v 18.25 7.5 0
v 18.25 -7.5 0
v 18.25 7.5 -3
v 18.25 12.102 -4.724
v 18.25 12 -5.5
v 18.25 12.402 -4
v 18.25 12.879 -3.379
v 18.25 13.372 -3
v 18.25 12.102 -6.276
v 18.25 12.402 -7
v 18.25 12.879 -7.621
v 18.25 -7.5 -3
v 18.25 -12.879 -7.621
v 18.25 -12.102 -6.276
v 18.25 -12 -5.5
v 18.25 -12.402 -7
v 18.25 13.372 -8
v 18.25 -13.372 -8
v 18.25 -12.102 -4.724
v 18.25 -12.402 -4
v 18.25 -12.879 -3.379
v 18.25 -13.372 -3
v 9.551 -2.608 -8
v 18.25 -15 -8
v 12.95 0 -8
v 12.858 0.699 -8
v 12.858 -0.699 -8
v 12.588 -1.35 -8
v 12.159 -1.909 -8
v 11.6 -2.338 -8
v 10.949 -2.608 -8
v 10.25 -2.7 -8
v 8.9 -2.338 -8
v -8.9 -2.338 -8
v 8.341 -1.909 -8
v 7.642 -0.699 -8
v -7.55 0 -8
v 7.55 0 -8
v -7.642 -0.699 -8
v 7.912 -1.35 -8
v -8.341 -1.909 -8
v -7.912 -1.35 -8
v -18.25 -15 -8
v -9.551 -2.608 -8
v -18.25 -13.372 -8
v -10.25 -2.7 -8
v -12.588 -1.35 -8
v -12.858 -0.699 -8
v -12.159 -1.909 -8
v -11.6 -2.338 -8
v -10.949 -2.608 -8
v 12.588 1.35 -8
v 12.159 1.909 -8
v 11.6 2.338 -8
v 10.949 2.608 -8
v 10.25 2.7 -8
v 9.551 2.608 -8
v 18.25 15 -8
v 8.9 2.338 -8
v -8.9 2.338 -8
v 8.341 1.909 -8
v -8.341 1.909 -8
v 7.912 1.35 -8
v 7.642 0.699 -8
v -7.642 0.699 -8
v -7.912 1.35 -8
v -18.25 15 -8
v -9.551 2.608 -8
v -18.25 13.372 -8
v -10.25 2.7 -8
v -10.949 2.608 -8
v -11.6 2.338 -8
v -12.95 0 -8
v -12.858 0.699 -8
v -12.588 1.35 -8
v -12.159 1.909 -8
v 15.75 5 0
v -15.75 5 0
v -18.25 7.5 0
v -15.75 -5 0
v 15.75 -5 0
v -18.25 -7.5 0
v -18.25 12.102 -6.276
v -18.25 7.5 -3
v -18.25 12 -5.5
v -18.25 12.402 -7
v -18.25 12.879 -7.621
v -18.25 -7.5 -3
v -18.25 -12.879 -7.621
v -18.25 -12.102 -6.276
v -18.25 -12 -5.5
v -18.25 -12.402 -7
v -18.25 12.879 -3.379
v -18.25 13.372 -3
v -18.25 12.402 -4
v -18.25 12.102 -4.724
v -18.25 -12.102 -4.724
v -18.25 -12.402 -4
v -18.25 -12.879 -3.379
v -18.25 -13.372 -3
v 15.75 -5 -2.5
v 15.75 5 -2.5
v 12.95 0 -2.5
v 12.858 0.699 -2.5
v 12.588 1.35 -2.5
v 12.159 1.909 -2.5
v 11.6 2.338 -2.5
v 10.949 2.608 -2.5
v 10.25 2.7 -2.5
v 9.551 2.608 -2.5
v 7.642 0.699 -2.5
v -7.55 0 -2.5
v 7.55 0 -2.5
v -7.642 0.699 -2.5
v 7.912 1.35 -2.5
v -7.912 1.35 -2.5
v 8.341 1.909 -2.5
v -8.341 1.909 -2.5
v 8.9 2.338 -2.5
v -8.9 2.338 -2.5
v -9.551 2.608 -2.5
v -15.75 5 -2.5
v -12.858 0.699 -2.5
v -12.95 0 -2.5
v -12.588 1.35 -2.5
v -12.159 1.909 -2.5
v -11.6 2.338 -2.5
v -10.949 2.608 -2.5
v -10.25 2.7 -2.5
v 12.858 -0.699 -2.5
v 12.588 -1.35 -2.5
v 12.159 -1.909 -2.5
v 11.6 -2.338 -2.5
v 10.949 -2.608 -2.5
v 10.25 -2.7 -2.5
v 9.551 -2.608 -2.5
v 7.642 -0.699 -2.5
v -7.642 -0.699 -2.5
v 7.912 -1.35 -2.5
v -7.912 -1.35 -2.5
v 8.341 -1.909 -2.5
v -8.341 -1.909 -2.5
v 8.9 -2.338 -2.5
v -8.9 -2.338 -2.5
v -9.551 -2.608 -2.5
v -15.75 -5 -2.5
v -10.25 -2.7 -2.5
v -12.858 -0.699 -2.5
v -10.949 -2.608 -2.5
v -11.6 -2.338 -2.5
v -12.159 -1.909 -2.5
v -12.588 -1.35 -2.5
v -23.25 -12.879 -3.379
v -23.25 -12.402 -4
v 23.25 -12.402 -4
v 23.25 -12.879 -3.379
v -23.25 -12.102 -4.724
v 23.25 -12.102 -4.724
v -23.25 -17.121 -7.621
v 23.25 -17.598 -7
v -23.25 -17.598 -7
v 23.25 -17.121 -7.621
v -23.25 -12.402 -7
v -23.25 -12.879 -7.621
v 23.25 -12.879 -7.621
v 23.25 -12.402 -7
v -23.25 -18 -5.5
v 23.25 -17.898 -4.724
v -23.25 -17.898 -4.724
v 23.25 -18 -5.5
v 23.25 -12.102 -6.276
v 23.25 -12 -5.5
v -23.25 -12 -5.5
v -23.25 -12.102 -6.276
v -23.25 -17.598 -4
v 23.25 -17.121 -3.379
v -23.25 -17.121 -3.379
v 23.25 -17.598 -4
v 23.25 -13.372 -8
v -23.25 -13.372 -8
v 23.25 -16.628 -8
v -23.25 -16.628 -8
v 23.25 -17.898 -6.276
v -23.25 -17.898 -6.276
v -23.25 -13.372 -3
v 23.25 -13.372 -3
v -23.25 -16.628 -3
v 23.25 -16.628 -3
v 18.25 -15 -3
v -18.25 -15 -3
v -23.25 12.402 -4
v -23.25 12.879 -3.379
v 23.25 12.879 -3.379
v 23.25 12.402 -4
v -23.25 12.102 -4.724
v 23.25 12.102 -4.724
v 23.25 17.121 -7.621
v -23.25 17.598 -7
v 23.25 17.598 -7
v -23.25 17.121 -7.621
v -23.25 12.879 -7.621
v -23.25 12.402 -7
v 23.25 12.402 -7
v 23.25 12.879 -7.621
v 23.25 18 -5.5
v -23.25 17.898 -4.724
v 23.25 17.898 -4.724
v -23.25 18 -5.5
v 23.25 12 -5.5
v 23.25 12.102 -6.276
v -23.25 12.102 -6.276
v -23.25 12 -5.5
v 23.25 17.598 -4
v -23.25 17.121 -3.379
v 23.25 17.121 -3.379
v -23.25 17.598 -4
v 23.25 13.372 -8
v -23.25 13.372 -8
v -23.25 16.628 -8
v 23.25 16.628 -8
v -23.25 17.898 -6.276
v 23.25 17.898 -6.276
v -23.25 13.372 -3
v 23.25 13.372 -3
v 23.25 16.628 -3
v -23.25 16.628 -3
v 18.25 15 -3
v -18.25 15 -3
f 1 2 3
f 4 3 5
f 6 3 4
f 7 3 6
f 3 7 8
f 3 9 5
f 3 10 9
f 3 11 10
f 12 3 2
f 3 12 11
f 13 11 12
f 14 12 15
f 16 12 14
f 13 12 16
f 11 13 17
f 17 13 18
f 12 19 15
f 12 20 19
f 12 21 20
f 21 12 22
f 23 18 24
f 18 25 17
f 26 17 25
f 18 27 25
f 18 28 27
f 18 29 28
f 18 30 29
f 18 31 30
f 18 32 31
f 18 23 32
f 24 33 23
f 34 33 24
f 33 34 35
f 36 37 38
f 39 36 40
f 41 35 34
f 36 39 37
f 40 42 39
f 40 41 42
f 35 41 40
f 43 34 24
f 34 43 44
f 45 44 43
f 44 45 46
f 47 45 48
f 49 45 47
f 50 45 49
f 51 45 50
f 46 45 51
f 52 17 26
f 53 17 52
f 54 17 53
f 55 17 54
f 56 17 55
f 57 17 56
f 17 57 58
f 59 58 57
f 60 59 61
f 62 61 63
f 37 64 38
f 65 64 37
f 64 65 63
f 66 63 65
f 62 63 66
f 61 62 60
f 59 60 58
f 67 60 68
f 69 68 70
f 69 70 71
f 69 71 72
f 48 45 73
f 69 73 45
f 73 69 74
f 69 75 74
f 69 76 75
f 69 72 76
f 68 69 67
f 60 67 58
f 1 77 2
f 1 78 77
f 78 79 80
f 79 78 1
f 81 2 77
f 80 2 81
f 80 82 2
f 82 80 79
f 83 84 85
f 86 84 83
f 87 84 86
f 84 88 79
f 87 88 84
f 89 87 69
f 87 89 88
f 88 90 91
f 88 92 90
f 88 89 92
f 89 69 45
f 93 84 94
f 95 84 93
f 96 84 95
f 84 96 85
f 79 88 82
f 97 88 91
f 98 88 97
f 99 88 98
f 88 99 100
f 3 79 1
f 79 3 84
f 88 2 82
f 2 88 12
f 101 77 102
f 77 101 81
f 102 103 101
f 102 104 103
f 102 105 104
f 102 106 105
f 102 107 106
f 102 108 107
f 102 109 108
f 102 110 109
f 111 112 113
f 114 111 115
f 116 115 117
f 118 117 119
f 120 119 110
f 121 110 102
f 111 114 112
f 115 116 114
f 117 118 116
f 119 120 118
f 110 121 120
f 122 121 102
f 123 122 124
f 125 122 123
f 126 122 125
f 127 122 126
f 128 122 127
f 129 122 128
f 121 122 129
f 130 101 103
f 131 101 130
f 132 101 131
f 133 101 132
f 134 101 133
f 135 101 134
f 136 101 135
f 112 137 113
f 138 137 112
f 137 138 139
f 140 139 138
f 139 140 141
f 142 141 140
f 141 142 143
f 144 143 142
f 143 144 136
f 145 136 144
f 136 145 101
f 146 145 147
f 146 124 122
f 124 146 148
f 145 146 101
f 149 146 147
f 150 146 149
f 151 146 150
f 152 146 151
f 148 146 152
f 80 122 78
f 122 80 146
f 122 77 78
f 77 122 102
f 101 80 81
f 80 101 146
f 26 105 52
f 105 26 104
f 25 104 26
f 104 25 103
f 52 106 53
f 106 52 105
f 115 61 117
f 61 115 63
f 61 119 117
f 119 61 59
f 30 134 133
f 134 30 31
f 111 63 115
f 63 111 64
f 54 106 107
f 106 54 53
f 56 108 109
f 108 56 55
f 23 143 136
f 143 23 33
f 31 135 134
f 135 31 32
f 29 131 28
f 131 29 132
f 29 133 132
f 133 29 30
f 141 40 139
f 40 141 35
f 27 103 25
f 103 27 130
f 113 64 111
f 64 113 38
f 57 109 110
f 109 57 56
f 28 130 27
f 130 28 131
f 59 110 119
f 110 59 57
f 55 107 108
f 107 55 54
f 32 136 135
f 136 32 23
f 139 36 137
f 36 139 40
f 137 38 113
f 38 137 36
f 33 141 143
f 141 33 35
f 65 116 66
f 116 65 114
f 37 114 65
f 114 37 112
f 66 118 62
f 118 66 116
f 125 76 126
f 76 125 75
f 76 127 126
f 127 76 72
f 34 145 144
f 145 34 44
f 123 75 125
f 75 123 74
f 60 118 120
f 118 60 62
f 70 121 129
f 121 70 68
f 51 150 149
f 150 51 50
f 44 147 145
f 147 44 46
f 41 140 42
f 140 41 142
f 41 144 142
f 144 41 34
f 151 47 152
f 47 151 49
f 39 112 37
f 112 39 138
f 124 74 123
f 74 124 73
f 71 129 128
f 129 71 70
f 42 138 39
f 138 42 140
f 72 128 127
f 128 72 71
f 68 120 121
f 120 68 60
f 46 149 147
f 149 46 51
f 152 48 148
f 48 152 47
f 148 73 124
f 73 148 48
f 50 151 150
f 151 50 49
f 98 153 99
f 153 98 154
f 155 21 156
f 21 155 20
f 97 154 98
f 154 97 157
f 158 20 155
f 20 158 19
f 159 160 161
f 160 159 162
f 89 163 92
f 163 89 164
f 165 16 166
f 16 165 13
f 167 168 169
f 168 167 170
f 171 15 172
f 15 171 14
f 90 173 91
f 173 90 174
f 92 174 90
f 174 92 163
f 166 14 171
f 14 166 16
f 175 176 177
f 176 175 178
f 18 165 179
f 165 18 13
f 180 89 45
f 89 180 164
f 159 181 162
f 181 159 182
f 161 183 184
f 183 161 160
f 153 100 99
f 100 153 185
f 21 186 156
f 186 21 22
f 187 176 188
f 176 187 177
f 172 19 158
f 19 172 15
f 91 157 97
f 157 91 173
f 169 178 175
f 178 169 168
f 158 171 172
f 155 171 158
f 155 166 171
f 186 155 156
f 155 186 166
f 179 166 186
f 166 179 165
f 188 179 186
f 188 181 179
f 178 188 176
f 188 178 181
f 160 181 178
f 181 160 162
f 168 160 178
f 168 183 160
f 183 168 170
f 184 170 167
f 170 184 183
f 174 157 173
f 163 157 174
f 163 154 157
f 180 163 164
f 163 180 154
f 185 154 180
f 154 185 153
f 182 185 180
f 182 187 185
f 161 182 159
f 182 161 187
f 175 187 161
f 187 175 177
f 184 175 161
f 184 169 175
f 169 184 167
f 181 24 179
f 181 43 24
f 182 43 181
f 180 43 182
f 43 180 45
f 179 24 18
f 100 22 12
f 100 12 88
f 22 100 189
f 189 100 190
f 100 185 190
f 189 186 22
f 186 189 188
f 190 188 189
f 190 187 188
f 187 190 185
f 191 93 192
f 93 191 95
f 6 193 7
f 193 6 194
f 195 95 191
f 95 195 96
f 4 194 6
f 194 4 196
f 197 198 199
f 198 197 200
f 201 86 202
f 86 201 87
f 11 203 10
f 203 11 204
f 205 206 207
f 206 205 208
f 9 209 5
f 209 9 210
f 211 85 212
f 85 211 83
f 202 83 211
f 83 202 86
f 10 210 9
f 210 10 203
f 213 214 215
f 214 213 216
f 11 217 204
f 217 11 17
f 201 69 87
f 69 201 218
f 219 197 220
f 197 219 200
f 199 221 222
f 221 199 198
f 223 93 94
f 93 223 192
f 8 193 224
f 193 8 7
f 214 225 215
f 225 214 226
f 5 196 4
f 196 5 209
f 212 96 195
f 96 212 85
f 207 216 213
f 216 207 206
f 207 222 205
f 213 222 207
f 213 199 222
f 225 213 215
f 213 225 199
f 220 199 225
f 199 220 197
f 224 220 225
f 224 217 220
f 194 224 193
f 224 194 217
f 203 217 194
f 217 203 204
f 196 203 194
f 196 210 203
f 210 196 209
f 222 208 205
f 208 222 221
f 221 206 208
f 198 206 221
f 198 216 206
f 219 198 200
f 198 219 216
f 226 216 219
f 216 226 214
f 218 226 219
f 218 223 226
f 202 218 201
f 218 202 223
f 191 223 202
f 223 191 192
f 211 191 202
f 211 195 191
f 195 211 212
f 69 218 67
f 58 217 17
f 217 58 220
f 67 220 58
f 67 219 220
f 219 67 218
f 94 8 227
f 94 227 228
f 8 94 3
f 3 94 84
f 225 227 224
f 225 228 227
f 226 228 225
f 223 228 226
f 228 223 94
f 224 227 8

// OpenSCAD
A_THICK=5;
A_HOLE=[31.5,10,3];
A_BODY=[
  A_HOLE[0]+A_THICK,
  A_HOLE[1]+A_THICK,
  A_HOLE[2]+A_THICK
];

module A_MountPlate() {
  difference() {
    translate([A_BODY[0],A_BODY[1],0]*-.5)
      cube(A_BODY);
    
    translate([A_HOLE[0],A_HOLE[1],0]*-.5)
    translate([0,0,-0.5])
      cube(A_HOLE);
    
    // screw holes
    translate([A_HOLE[0]*0.5 - 5.5,0,0])
      cylinder(r=2.7, h=5+A_THICK, $fn=24);
    
    translate([A_HOLE[0]*0.5 - 5.5,0,0]*-1)
      cylinder(r=2.7, h=5+A_THICK, $fn=24);
  }
}

module B_PivotRod(radius=3) {
  union(){
    translate([A_BODY[0]+10,0,11]*-.5)
    rotate([0,90,0])
    difference(){
      cylinder(r=radius, h=A_BODY[0]+10, $fn=24);

      translate([radius-0.5,0,0])
      translate([0,1,1]*-50)
        cube([100,100,100]);
      
      mirror([1,0,0])
      translate([radius-0.5,0,0])
      translate([0,1,1]*-50)
        cube([100,100,100]);
    }

    translate([0,0,-A_BODY[2]])    
    translate([A_BODY[0],0,0]*-.5)
      cube([A_BODY[0],8,5]);
  }
}

mirror([0,0,1])
  A_MountPlate();
translate([0,-A_BODY[1],0])
  B_PivotRod();
mirror([0,1,0])
translate([0,-A_BODY[1],0])
  B_PivotRod();
